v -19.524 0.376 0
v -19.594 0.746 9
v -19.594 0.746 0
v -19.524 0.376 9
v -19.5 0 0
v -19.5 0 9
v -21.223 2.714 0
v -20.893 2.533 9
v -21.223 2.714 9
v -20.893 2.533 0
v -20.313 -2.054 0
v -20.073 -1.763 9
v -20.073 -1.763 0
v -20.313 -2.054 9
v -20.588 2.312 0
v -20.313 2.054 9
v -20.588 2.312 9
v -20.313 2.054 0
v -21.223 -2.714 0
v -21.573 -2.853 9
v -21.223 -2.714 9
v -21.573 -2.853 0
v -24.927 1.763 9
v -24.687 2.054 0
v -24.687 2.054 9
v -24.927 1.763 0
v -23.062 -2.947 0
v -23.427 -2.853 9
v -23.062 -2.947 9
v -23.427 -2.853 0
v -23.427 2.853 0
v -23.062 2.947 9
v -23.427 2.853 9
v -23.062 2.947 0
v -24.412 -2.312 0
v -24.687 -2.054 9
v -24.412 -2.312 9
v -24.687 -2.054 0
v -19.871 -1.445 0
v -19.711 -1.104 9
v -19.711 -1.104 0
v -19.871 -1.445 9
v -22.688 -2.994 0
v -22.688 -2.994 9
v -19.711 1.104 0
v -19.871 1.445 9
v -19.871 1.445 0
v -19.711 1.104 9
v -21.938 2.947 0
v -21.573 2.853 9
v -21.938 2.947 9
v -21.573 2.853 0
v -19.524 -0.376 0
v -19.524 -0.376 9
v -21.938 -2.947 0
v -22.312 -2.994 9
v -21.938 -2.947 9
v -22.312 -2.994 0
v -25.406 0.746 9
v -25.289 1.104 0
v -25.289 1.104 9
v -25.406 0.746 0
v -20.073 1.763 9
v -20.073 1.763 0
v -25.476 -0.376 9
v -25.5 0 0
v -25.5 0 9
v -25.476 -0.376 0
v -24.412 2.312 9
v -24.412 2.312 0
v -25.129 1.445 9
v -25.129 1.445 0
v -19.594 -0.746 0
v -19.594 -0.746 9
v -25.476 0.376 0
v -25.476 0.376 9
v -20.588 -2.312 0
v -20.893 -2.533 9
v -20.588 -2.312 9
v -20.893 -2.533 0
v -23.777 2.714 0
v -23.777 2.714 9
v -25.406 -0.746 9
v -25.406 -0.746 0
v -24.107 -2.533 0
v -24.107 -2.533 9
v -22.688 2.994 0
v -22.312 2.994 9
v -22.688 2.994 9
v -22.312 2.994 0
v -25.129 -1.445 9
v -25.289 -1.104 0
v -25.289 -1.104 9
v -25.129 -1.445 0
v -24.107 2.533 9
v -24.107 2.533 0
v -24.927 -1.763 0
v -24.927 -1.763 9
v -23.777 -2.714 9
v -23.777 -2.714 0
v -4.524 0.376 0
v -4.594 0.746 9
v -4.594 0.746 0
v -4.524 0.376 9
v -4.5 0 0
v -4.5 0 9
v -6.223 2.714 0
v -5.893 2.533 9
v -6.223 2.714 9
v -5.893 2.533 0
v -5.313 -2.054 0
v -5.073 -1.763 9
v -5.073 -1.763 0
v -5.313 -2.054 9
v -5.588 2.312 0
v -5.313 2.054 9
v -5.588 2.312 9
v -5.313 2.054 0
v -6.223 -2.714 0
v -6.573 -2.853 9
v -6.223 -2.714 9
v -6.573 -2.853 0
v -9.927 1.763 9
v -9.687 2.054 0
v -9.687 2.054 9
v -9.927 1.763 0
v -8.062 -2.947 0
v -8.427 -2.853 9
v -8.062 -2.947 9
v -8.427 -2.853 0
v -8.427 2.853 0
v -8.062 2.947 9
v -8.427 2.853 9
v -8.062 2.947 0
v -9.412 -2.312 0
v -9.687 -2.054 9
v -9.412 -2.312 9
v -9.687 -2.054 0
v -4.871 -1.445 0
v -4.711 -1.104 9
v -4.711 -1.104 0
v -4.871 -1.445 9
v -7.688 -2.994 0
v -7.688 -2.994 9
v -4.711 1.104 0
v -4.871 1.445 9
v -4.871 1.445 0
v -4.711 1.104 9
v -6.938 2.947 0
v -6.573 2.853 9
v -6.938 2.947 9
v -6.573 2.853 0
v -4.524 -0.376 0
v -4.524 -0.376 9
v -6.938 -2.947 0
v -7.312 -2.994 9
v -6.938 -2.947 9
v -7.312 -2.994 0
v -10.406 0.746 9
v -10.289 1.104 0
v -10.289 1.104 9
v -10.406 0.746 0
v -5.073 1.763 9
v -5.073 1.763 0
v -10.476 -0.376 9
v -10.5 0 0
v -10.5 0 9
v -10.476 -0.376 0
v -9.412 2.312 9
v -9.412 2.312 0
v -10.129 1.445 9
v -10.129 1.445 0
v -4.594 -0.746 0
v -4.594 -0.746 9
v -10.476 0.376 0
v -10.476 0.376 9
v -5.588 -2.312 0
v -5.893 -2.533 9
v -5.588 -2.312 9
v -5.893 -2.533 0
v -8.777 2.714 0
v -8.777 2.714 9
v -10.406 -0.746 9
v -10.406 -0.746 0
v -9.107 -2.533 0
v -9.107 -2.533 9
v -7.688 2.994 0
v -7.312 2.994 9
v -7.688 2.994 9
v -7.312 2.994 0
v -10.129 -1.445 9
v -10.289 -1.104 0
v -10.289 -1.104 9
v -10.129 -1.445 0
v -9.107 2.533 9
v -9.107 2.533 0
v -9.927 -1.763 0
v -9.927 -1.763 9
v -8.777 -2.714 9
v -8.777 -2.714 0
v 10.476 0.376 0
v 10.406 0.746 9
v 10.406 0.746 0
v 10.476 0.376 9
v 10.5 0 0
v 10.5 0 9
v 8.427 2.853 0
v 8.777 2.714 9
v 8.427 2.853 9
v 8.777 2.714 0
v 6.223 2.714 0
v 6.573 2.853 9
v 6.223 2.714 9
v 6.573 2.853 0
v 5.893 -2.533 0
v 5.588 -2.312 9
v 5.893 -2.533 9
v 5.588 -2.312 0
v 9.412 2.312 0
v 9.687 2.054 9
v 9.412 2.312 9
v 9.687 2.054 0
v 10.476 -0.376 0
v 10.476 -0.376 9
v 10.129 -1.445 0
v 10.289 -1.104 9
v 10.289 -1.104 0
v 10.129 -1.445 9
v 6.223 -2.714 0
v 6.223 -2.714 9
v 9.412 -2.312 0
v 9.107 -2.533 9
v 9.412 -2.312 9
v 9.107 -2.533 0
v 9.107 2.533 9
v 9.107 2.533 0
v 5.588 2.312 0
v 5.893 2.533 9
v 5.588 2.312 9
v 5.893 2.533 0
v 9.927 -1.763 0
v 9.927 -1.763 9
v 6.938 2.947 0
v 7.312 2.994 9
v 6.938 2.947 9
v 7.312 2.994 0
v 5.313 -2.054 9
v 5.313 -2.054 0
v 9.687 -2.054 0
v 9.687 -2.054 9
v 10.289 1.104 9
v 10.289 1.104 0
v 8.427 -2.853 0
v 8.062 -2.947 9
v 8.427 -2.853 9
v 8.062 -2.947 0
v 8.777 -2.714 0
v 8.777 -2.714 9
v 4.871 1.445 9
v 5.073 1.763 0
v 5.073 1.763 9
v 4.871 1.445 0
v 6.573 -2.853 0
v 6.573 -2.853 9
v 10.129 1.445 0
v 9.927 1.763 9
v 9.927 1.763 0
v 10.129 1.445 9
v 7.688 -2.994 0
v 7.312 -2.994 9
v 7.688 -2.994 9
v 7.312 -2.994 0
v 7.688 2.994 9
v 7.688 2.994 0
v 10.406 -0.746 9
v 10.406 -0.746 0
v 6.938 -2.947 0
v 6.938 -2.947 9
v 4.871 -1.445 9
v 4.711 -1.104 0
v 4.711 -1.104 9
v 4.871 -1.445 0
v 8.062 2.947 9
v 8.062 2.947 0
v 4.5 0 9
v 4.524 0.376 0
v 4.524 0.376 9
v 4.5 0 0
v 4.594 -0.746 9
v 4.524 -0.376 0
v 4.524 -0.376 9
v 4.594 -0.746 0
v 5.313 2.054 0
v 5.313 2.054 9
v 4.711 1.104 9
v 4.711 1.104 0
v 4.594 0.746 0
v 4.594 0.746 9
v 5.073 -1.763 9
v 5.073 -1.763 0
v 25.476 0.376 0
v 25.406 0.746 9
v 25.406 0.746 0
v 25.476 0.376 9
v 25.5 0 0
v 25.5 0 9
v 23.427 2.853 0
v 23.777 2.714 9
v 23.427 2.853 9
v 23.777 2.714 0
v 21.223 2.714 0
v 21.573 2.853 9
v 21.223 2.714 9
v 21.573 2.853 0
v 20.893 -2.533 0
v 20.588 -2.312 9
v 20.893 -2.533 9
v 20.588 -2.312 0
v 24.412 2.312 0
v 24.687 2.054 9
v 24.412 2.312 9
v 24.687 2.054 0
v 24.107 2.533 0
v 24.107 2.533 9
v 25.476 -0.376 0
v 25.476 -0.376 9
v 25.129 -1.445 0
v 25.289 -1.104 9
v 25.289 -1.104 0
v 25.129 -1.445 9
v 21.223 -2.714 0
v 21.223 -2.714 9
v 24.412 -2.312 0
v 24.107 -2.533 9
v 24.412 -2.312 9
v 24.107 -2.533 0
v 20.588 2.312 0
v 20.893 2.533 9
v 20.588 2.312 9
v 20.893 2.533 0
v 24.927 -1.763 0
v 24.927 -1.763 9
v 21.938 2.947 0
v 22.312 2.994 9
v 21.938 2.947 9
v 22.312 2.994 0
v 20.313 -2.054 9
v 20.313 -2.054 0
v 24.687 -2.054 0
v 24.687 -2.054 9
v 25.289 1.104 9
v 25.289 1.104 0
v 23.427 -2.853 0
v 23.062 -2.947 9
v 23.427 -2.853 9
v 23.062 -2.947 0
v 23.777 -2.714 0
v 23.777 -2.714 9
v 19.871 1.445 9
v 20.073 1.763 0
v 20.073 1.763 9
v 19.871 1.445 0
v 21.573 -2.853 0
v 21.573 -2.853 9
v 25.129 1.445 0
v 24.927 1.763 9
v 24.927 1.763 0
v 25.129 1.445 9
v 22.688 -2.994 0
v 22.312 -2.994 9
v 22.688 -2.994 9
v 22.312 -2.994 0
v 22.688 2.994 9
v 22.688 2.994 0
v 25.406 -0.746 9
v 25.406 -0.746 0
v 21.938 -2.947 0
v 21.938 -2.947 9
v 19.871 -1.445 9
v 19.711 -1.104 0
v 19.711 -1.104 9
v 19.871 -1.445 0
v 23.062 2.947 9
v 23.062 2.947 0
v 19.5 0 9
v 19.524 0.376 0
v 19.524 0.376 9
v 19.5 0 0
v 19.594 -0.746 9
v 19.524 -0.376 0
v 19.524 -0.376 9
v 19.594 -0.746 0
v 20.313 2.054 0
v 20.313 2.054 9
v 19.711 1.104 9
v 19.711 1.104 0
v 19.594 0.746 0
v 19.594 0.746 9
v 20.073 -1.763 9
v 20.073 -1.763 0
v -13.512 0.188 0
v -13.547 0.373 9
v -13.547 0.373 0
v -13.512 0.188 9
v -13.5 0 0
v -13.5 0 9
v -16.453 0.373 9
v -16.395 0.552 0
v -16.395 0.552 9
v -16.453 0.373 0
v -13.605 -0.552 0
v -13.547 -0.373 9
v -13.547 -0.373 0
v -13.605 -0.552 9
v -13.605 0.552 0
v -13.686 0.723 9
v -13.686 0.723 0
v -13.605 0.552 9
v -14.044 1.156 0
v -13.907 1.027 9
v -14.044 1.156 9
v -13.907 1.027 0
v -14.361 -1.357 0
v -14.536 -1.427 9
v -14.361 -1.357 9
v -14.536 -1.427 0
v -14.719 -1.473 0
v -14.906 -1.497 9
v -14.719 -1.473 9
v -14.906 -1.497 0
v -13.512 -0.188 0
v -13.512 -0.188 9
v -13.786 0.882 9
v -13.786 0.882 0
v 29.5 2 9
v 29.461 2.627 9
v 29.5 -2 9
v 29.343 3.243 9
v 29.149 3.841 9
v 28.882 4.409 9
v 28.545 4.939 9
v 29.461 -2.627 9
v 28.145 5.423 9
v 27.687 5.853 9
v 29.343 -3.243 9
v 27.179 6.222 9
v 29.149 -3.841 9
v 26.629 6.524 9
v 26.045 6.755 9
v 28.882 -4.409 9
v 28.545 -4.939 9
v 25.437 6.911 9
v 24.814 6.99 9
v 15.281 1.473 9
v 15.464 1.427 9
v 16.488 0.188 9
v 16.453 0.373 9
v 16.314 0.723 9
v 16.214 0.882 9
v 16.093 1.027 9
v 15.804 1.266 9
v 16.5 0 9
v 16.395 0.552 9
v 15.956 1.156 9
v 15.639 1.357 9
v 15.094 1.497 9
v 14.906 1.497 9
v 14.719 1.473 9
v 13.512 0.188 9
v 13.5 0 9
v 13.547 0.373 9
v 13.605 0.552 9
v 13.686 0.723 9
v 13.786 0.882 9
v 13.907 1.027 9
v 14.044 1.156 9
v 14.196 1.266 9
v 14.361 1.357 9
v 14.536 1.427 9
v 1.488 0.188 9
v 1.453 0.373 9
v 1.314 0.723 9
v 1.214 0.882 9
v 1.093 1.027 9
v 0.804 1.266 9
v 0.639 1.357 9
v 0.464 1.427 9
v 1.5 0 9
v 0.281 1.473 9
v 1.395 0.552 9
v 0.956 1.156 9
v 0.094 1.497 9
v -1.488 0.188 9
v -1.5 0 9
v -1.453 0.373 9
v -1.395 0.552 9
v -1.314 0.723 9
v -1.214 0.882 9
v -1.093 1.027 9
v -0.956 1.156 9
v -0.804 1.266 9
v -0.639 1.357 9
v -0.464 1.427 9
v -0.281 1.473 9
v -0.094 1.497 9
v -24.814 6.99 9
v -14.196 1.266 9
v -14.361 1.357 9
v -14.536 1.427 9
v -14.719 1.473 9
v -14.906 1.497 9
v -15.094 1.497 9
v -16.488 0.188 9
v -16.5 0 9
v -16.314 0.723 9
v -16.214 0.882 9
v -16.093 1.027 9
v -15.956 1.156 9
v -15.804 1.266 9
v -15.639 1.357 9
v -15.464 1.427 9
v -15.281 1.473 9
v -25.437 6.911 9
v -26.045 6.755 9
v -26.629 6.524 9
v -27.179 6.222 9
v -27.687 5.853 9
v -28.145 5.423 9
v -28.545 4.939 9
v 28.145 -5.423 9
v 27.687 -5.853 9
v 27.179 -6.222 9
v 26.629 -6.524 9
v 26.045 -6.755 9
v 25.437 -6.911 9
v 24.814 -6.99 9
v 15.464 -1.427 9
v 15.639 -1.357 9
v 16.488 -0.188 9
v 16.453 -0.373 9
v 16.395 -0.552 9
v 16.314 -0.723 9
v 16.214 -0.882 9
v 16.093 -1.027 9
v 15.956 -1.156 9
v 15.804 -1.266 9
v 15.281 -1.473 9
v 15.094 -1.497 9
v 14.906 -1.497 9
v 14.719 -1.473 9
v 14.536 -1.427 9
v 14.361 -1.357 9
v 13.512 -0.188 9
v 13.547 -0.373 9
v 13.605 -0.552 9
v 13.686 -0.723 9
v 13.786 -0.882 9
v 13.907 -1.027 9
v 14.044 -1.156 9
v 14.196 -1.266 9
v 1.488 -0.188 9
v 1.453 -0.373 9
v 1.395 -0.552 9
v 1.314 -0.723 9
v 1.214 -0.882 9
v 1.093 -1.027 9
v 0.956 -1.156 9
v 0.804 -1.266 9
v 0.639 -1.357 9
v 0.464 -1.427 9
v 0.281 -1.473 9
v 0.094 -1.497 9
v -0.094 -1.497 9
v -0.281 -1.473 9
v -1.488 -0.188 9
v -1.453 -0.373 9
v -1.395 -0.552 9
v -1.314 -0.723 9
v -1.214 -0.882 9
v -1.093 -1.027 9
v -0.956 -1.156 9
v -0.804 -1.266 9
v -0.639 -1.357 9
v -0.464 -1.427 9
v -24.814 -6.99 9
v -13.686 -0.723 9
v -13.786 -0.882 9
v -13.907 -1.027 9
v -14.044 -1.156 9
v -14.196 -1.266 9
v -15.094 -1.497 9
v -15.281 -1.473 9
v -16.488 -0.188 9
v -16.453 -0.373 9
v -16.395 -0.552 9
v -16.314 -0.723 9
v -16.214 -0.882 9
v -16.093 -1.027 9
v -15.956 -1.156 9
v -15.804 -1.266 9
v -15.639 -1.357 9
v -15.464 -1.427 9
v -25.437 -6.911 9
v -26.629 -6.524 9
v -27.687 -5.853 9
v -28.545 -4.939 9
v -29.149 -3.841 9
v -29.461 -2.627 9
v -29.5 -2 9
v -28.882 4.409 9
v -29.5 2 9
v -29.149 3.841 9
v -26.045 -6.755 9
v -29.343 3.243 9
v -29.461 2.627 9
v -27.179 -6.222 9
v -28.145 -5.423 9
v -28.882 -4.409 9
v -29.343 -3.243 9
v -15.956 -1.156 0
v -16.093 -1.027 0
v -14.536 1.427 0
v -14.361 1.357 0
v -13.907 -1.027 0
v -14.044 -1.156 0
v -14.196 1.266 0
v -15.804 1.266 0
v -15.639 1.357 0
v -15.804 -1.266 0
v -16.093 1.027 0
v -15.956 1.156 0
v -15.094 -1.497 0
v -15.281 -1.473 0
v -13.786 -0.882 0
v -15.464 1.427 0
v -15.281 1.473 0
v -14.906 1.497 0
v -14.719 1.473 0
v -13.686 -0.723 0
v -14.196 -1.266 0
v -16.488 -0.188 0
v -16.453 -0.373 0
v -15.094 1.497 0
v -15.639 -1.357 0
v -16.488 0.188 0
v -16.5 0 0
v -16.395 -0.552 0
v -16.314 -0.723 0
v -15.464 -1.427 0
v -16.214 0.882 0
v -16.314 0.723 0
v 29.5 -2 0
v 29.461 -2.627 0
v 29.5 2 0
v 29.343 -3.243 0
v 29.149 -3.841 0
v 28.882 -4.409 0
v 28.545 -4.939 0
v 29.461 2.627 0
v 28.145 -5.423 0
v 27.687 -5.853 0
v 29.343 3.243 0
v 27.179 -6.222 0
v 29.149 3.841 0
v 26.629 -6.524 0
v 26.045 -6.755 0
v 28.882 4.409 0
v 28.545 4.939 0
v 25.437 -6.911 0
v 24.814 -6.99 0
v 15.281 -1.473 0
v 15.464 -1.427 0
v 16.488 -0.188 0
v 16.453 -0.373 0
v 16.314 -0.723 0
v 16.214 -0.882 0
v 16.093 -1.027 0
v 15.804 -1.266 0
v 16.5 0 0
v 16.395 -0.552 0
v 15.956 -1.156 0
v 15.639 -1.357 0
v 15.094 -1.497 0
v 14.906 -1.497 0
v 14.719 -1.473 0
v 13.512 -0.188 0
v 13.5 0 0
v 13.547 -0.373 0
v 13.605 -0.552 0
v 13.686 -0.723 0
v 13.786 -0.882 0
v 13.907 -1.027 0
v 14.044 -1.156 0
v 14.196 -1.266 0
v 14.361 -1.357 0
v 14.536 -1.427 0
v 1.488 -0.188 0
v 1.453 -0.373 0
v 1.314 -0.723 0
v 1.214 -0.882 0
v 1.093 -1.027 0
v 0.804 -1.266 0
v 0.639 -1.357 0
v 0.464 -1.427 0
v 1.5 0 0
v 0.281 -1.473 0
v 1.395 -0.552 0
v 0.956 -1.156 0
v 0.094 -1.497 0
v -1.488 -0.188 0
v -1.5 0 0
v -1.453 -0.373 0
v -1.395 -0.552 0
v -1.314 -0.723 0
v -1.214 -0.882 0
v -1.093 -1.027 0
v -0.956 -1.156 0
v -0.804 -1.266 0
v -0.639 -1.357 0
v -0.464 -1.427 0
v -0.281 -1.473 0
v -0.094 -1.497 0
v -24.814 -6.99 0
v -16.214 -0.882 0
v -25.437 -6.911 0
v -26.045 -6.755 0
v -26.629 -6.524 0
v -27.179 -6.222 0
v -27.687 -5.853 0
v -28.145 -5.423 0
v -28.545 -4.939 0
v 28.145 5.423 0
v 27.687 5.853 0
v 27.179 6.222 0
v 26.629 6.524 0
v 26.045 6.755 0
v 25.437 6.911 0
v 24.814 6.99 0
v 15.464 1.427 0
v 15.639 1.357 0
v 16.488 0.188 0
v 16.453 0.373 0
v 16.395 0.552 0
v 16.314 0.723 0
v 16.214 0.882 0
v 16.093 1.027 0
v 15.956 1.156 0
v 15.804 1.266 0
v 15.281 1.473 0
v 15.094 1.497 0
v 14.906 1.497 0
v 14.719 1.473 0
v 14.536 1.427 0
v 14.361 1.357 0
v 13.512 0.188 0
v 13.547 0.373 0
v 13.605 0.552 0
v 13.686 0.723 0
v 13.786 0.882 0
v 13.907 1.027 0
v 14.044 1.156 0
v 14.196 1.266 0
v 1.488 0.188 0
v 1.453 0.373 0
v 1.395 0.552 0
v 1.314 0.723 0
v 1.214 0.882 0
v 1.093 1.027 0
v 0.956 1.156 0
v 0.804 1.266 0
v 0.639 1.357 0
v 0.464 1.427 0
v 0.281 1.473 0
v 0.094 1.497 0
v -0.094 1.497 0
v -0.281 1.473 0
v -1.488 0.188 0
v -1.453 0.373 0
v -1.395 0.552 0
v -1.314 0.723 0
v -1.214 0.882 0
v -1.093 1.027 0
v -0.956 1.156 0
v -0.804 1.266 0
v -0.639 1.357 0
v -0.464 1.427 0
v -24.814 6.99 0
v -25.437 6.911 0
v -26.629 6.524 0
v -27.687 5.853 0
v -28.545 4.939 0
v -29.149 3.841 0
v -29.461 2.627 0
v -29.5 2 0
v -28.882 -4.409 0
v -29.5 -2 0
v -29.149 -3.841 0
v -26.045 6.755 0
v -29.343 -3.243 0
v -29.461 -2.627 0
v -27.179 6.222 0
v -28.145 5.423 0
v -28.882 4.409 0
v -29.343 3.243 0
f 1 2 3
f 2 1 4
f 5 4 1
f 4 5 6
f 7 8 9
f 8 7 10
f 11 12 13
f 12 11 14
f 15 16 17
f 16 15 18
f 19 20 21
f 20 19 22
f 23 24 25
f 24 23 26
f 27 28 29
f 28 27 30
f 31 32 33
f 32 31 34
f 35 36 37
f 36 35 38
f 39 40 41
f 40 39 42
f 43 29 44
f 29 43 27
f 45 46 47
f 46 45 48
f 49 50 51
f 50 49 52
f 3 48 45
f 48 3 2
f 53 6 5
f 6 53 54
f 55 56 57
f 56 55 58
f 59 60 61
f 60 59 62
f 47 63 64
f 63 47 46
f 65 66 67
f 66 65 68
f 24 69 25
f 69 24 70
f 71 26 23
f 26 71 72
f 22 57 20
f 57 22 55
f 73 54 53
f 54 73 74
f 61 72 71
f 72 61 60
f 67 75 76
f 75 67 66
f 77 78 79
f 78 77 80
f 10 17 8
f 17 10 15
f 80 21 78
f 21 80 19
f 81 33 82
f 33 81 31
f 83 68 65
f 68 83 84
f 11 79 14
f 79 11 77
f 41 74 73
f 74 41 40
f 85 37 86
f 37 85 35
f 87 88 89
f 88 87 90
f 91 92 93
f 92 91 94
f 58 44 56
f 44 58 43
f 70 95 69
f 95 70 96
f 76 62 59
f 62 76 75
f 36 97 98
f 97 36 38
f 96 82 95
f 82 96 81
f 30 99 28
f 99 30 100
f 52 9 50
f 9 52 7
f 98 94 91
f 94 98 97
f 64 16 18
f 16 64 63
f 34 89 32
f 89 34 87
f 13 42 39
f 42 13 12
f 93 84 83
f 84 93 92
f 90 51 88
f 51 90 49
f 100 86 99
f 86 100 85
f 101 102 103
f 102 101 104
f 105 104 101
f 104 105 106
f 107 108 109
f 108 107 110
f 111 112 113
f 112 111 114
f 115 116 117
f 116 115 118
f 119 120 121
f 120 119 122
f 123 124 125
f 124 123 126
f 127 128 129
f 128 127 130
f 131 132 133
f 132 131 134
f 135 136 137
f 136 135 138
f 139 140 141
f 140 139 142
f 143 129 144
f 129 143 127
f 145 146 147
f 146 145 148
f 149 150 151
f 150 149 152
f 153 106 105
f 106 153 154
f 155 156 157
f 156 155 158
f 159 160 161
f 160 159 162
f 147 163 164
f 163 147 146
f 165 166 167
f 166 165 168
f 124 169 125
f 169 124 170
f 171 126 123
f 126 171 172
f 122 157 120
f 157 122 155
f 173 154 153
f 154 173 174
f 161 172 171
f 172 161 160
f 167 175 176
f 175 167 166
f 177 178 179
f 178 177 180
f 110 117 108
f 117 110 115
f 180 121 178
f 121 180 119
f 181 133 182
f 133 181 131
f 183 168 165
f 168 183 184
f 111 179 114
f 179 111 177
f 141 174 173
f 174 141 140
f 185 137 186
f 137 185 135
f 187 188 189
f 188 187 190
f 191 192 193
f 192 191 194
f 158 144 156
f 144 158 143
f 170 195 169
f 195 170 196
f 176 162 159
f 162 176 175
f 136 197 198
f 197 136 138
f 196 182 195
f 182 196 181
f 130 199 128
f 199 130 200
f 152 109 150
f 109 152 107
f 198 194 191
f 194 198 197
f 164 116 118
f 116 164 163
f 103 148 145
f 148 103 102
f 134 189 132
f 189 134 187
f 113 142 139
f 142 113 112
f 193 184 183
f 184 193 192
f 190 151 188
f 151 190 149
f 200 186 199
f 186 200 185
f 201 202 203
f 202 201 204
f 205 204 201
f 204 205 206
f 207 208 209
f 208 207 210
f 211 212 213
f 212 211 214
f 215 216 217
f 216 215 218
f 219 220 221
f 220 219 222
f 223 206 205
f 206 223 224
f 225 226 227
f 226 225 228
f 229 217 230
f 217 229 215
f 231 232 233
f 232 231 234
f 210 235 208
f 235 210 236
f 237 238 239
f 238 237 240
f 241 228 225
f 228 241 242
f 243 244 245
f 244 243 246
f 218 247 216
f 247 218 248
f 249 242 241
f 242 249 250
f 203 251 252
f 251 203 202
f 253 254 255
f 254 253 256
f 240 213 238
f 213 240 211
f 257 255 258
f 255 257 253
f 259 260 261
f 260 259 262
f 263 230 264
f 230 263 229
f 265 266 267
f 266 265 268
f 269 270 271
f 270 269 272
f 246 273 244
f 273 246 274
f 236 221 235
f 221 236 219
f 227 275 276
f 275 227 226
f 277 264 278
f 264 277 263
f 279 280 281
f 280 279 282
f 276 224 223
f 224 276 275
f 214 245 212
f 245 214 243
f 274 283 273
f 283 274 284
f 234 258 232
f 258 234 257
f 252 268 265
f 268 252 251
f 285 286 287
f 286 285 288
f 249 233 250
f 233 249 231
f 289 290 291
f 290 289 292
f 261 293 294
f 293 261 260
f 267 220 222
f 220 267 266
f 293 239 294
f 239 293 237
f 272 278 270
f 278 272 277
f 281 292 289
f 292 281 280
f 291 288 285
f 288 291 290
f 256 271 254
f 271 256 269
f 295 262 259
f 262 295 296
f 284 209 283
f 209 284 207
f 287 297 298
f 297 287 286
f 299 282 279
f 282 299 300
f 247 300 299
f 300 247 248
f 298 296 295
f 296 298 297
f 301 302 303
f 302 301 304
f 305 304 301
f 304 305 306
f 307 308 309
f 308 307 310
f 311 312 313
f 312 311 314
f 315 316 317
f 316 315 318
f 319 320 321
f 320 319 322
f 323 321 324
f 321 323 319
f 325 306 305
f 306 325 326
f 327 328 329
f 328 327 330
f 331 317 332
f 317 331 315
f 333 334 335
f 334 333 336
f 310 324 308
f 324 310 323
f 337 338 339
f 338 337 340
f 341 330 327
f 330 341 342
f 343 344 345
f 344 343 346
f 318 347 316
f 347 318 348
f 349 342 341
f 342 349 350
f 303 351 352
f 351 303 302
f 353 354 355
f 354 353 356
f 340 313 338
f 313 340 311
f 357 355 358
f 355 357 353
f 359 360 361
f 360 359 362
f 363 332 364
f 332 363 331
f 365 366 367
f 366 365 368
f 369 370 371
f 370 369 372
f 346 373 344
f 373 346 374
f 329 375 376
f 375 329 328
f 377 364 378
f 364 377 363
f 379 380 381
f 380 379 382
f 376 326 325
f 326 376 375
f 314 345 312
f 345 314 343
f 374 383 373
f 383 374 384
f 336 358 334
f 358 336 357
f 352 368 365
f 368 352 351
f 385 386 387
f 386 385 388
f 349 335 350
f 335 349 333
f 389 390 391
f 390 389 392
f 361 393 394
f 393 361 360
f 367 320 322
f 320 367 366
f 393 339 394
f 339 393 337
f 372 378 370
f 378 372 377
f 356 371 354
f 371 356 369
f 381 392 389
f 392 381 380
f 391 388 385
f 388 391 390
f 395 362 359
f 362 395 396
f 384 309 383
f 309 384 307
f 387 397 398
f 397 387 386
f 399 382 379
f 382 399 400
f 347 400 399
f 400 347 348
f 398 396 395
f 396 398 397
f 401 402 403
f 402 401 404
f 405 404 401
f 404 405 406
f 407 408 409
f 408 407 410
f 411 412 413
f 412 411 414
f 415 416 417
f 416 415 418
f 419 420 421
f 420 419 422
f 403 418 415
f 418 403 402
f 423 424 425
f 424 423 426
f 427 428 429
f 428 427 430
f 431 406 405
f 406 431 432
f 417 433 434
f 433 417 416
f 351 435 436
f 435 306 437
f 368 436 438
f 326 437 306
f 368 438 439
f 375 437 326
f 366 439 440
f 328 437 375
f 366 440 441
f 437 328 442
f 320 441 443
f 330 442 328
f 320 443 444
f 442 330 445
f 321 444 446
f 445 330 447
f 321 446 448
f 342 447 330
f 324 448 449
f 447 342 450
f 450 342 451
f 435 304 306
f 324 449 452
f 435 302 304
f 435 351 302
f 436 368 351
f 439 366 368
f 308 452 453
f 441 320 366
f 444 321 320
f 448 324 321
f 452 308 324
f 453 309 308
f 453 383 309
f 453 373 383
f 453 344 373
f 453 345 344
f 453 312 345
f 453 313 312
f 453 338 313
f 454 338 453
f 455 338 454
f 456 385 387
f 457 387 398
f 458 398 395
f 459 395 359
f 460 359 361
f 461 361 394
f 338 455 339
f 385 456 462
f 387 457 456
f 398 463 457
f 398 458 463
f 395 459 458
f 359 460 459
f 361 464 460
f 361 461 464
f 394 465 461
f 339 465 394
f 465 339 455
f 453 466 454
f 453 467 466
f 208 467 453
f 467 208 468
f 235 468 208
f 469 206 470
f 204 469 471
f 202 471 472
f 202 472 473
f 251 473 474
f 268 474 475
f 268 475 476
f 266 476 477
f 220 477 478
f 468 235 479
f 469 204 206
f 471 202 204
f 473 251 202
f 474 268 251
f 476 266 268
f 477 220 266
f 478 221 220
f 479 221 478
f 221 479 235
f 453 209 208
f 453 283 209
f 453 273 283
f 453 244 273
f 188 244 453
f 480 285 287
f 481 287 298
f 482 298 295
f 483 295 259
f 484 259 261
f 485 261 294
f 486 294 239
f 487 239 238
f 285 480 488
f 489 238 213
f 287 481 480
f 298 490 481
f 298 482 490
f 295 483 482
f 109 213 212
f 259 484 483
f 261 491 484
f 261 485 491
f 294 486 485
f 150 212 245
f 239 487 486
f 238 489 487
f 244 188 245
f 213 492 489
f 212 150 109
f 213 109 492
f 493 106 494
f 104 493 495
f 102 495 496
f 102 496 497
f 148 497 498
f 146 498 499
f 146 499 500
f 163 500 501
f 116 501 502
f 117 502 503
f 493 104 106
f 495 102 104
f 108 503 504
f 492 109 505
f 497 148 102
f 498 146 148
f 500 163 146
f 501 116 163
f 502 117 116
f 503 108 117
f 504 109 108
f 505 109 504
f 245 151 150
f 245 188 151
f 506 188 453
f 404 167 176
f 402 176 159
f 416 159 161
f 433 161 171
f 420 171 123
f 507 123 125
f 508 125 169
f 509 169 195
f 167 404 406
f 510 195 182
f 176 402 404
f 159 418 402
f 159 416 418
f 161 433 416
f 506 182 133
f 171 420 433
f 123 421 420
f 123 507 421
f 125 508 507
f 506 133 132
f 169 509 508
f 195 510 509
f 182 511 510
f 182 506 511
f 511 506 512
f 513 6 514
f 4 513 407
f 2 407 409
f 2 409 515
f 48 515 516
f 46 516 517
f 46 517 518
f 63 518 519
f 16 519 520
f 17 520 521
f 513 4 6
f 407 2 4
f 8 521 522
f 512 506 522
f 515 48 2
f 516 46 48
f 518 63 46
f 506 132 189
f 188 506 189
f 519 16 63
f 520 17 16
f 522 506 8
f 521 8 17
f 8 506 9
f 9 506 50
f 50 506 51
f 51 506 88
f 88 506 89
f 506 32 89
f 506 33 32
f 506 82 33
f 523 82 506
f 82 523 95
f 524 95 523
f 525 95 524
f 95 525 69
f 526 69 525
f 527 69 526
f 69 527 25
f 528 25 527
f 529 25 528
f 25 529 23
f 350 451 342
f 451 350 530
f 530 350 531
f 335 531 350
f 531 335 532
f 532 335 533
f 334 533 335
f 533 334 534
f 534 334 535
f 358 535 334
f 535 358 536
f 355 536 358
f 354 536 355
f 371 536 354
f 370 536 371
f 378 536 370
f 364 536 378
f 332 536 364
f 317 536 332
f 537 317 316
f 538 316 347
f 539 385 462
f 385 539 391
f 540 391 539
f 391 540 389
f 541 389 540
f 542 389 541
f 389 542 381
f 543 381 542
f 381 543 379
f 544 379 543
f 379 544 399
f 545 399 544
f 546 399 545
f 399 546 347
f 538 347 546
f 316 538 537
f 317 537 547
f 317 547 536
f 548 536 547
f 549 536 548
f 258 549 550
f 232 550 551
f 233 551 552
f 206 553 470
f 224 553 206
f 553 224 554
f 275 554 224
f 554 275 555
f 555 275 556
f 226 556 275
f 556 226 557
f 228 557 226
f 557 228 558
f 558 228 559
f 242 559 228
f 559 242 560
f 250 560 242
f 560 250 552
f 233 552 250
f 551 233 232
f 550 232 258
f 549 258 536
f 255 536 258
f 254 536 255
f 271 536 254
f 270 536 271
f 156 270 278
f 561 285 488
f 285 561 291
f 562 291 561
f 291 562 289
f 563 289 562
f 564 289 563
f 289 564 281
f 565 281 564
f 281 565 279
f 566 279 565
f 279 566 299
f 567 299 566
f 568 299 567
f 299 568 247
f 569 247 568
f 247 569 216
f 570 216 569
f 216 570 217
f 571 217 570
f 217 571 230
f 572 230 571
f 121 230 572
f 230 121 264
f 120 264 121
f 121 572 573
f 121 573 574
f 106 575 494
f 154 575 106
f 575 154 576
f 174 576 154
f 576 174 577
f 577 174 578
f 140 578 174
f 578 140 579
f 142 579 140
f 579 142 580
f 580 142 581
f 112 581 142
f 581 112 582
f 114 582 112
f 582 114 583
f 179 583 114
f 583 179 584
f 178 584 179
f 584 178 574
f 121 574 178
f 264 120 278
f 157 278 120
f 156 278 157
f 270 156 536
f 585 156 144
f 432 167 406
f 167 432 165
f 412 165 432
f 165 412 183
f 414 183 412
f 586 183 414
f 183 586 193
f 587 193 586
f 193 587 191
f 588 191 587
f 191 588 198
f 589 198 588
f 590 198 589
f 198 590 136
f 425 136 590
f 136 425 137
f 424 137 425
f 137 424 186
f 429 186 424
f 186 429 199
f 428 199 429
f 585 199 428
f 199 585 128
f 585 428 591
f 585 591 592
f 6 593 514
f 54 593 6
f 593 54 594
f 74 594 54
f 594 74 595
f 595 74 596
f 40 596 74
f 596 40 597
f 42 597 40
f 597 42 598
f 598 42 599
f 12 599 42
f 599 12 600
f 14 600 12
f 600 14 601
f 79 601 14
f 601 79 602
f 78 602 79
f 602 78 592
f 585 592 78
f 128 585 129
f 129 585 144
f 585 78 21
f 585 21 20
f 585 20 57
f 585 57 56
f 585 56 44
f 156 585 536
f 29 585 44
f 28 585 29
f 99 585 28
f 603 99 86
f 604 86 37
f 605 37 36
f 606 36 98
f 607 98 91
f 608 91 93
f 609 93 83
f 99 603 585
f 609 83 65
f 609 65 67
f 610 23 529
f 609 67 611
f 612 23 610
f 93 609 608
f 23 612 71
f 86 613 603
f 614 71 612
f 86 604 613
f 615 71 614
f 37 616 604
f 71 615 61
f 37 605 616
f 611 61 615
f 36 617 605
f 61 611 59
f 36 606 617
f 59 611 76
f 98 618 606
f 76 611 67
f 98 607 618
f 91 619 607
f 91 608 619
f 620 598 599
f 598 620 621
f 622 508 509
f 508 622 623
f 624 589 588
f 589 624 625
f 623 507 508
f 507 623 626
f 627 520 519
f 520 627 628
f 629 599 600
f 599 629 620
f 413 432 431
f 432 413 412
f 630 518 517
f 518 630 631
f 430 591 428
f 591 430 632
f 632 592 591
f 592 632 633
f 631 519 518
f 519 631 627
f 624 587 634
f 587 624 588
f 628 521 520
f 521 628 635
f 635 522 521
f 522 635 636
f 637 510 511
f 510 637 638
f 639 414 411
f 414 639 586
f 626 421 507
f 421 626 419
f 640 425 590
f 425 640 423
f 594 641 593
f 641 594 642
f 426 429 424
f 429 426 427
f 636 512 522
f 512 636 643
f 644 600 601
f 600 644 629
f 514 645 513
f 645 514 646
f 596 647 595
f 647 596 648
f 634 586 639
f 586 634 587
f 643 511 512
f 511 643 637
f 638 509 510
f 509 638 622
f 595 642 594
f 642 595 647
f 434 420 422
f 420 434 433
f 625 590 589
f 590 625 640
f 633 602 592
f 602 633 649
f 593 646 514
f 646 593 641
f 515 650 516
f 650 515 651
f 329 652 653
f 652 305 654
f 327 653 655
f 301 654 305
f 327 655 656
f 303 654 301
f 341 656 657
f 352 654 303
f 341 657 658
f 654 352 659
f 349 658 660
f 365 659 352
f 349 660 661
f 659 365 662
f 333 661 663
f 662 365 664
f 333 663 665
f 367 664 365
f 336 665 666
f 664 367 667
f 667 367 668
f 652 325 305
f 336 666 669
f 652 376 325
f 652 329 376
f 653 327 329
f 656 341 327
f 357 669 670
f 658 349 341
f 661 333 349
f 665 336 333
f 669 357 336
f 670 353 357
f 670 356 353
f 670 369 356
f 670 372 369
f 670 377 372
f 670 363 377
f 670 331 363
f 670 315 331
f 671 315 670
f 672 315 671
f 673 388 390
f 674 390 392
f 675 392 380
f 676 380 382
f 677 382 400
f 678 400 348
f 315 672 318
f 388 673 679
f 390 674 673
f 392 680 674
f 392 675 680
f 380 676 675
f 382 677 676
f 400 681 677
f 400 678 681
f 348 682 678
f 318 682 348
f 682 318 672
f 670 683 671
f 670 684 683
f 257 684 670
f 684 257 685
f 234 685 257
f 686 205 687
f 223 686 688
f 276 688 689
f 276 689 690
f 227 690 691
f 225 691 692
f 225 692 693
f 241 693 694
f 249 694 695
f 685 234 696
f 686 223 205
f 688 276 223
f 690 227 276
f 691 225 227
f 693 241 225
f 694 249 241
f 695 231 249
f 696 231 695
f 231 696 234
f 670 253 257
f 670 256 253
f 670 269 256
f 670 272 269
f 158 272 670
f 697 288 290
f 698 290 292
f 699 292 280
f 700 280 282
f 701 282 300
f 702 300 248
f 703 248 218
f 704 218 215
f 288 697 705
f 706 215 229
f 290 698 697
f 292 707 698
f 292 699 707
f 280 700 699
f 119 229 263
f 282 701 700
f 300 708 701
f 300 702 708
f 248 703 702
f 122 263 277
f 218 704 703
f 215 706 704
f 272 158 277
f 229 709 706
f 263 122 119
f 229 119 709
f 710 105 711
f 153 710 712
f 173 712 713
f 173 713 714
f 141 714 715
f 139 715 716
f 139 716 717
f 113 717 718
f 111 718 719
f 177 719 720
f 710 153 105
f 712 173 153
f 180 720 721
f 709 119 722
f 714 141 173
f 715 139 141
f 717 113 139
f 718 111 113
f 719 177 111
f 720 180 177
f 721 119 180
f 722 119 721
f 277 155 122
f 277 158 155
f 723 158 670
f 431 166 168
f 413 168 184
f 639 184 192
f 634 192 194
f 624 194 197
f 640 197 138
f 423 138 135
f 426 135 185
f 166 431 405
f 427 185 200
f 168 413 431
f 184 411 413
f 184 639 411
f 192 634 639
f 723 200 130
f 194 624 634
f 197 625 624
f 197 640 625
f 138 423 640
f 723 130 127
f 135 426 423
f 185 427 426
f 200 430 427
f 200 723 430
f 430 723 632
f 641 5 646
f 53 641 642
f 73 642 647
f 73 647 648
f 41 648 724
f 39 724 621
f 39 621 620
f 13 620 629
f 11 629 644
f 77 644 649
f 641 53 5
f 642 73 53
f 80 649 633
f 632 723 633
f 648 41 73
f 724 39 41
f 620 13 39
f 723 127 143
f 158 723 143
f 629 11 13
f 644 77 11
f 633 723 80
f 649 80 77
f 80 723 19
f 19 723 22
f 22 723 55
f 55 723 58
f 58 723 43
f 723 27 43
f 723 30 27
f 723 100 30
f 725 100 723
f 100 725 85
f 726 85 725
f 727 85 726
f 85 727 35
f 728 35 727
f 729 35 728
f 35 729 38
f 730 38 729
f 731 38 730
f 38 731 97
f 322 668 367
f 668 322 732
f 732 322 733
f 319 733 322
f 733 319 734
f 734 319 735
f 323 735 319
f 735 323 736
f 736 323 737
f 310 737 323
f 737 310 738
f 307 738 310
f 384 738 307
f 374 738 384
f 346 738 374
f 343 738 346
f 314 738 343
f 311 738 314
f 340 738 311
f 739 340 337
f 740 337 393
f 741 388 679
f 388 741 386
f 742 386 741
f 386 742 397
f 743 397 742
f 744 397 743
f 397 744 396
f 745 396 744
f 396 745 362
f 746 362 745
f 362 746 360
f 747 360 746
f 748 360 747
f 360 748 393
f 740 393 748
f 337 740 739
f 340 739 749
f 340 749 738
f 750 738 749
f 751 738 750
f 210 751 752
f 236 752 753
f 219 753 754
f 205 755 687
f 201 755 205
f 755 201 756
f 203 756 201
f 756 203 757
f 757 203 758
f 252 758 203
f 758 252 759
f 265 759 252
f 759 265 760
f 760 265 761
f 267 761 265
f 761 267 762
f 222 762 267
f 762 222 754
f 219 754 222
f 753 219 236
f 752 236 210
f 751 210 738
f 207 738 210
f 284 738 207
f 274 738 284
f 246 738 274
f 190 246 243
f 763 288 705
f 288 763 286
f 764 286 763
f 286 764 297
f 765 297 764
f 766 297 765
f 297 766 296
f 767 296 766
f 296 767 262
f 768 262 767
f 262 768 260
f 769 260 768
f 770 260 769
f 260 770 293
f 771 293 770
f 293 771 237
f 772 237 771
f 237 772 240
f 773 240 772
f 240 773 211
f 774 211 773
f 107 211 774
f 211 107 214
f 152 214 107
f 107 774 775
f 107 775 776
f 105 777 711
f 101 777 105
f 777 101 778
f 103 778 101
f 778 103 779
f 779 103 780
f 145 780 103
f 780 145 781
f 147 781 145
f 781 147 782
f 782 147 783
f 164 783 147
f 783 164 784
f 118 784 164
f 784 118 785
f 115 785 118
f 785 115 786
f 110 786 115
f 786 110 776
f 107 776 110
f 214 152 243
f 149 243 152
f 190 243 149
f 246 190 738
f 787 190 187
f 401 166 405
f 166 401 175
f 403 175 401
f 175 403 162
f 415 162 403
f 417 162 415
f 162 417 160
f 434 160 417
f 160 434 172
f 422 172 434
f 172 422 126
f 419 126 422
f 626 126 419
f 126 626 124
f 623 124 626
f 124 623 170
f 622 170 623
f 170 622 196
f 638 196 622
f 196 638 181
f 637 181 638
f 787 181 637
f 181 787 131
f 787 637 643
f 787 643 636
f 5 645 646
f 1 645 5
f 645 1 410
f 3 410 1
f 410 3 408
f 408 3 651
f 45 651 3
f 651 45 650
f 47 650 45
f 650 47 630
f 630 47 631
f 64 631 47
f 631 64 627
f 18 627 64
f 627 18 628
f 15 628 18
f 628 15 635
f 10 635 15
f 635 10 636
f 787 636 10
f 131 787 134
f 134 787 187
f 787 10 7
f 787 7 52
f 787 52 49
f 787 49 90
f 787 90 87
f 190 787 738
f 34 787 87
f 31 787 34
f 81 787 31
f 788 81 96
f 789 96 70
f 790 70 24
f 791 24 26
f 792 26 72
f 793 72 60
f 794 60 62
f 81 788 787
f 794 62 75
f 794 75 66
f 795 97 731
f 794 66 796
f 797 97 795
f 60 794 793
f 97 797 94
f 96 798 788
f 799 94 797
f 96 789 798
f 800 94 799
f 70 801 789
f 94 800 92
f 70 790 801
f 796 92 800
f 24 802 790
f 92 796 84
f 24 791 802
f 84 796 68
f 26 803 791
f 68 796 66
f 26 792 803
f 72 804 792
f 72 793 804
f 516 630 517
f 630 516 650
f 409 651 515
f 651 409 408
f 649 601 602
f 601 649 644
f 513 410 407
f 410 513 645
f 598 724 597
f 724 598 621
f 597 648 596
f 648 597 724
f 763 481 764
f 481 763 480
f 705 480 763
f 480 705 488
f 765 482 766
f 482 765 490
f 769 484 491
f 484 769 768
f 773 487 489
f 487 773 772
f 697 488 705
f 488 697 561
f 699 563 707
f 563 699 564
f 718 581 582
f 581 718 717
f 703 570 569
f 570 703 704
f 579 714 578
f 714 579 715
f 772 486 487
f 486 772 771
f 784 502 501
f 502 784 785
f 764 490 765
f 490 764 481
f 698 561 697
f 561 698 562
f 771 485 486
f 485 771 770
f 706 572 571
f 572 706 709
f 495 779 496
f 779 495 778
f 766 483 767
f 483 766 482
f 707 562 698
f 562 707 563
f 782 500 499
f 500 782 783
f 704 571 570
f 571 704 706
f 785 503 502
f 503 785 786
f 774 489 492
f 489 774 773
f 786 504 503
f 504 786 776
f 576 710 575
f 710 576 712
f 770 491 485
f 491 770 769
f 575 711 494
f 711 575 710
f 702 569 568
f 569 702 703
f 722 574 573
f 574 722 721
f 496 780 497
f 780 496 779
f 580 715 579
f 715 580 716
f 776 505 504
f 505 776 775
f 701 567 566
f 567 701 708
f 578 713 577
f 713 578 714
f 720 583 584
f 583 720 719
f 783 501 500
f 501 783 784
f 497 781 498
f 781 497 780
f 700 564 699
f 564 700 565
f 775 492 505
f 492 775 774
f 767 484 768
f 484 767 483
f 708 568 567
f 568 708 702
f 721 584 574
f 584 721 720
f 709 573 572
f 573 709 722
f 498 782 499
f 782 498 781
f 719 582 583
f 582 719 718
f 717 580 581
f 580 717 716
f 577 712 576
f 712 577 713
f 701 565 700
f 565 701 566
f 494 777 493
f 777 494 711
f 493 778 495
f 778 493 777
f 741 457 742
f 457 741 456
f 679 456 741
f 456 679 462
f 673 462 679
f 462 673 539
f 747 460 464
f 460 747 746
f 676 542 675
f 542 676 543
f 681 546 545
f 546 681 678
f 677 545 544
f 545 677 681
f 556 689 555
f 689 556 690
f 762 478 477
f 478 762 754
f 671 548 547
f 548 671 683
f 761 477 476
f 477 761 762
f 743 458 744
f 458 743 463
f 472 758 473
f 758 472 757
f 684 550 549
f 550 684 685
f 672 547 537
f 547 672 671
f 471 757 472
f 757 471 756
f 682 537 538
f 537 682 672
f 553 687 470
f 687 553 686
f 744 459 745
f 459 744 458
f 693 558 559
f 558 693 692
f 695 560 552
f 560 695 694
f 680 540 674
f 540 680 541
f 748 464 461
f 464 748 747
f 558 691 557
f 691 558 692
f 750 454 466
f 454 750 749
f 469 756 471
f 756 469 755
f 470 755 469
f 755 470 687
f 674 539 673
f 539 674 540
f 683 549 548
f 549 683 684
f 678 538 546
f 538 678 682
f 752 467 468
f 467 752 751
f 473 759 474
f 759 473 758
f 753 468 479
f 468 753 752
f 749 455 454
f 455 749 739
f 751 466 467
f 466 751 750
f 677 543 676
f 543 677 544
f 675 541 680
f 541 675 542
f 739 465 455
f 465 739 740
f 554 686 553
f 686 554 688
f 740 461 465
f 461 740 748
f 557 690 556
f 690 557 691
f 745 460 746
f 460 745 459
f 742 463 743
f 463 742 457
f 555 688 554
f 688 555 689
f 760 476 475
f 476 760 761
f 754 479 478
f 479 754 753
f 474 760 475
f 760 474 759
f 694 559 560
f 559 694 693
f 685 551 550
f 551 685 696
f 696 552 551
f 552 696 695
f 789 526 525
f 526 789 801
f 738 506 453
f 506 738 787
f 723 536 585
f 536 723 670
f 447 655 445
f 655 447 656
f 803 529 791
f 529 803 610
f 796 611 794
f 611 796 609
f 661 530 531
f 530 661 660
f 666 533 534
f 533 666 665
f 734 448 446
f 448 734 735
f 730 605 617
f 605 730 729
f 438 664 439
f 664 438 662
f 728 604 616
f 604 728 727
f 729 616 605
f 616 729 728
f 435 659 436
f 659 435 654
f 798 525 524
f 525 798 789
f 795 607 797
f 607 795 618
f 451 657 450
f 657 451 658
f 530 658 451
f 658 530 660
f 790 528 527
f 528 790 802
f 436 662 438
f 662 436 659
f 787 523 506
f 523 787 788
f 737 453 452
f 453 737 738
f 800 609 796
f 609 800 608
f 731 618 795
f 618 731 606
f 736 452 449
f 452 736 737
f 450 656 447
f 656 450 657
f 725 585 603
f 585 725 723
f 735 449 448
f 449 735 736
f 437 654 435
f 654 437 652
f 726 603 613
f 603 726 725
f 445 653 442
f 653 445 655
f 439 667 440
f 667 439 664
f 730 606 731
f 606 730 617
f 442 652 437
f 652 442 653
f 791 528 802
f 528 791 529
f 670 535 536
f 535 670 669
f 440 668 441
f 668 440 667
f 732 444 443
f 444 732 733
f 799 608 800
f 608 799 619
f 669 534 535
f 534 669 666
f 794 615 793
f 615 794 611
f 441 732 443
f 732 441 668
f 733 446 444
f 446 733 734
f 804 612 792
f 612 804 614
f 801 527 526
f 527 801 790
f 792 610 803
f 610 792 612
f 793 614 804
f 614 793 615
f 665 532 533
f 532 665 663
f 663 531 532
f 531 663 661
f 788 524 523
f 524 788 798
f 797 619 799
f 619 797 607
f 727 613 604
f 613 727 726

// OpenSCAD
$fn = 50;


difference() {
	union() {
		hull() {
			translate(v = [-24.5000000000, 2.0000000000, 0]) {
				cylinder(h = 9, r = 5);
			}
			translate(v = [24.5000000000, 2.0000000000, 0]) {
				cylinder(h = 9, r = 5);
			}
			translate(v = [-24.5000000000, -2.0000000000, 0]) {
				cylinder(h = 9, r = 5);
			}
			translate(v = [24.5000000000, -2.0000000000, 0]) {
				cylinder(h = 9, r = 5);
			}
		}
	}
	union() {
		translate(v = [-22.5000000000, 0.0000000000, -100.0000000000]) {
			cylinder(h = 200, r = 3.0000000000);
		}
		translate(v = [-7.5000000000, 0.0000000000, -100.0000000000]) {
			cylinder(h = 200, r = 3.0000000000);
		}
		translate(v = [7.5000000000, 0.0000000000, -100.0000000000]) {
			cylinder(h = 200, r = 3.0000000000);
		}
		translate(v = [22.5000000000, 0.0000000000, -100.0000000000]) {
			cylinder(h = 200, r = 3.0000000000);
		}
		translate(v = [-22.5000000000, 0.0000000000, 0]) {
			cylinder(h = 9, r = 1.5000000000);
		}
		translate(v = [-15.0000000000, 0.0000000000, 0]) {
			cylinder(h = 9, r = 1.5000000000);
		}
		translate(v = [-7.5000000000, 0.0000000000, 0]) {
			cylinder(h = 9, r = 1.5000000000);
		}
		cylinder(h = 9, r = 1.5000000000);
		translate(v = [7.5000000000, 0.0000000000, 0]) {
			cylinder(h = 9, r = 1.5000000000);
		}
		translate(v = [15.0000000000, 0.0000000000, 0]) {
			cylinder(h = 9, r = 1.5000000000);
		}
		translate(v = [22.5000000000, 0.0000000000, 0]) {
			cylinder(h = 9, r = 1.5000000000);
		}
		translate(v = [-22.5000000000, 0.0000000000, 0]) {
			cylinder(h = 9, r = 1.5000000000);
		}
		translate(v = [-15.0000000000, 0.0000000000, 0]) {
			cylinder(h = 9, r = 1.5000000000);
		}
		translate(v = [-7.5000000000, 0.0000000000, 0]) {
			cylinder(h = 9, r = 1.5000000000);
		}
		cylinder(h = 9, r = 1.5000000000);
		translate(v = [7.5000000000, 0.0000000000, 0]) {
			cylinder(h = 9, r = 1.5000000000);
		}
		translate(v = [15.0000000000, 0.0000000000, 0]) {
			cylinder(h = 9, r = 1.5000000000);
		}
		translate(v = [22.5000000000, 0.0000000000, 0]) {
			cylinder(h = 9, r = 1.5000000000);
		}
		translate(v = [-22.5000000000, 0.0000000000, 0]) {
			cylinder(h = 9, r = 1.5000000000);
		}
		translate(v = [-15.0000000000, 0.0000000000, 0]) {
			cylinder(h = 9, r = 1.5000000000);
		}
		translate(v = [-7.5000000000, 0.0000000000, 0]) {
			cylinder(h = 9, r = 1.5000000000);
		}
		cylinder(h = 9, r = 1.5000000000);
		translate(v = [7.5000000000, 0.0000000000, 0]) {
			cylinder(h = 9, r = 1.5000000000);
		}
		translate(v = [15.0000000000, 0.0000000000, 0]) {
			cylinder(h = 9, r = 1.5000000000);
		}
		translate(v = [22.5000000000, 0.0000000000, 0]) {
			cylinder(h = 9, r = 1.5000000000);
		}
	}
}
